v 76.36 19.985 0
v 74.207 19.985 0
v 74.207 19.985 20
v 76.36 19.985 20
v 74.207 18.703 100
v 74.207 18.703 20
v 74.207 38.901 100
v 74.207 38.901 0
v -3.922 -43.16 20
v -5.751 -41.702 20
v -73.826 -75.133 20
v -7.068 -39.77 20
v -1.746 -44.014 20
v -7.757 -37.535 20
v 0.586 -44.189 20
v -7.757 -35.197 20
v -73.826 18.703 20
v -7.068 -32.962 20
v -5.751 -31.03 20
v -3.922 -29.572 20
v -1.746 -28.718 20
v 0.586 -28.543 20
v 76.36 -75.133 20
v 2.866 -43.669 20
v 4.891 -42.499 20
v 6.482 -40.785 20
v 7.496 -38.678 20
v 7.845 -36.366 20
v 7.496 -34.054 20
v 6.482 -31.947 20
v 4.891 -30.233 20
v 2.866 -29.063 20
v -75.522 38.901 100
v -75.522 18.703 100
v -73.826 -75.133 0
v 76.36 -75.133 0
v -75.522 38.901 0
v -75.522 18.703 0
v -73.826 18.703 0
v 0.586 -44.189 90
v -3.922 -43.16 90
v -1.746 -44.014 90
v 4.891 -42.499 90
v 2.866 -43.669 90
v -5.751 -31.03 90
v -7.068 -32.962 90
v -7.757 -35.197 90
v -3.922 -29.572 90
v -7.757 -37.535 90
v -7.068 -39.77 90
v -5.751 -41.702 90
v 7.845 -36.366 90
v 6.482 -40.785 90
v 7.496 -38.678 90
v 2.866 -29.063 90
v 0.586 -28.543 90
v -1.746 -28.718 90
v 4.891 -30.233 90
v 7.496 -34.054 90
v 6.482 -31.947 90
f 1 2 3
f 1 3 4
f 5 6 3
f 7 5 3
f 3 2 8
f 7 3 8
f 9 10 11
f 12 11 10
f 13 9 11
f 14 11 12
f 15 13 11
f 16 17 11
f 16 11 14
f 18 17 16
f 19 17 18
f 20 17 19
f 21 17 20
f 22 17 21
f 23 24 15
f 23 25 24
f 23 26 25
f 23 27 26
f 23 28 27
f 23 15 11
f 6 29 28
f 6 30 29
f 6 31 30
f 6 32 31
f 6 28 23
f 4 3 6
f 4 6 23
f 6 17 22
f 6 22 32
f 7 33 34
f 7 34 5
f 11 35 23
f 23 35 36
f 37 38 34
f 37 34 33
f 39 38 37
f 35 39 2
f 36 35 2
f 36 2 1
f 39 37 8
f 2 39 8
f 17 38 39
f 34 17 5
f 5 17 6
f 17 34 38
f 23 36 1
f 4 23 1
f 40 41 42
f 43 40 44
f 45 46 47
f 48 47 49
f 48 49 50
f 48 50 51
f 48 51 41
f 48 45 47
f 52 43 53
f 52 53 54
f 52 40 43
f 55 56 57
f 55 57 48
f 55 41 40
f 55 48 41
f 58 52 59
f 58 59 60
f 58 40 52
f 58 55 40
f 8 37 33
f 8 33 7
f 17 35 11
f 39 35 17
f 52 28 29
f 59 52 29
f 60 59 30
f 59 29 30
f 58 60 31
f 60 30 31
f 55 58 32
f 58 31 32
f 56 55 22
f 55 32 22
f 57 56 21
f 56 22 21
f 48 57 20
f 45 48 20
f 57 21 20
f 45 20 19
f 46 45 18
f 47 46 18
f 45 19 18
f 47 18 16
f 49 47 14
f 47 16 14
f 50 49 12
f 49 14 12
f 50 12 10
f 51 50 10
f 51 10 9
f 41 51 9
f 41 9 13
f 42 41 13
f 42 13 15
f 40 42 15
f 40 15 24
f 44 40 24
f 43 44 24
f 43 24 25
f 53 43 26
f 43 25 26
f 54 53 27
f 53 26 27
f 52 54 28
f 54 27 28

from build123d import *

# Parameters (mm, degrees)
F0_W     = 150.186099
F0_H     = 95.117865
F1_DEPTH = 20
F2_R     = 7.844958
F3_DEPTH = 70
F4_W     = 149.729192
F4_H     = 20.198451
F5_DEPTH = 100


with BuildPart() as f1:
    # F0 (on Top) → F1 (new body)
    with BuildSketch(Plane.XY):
        with Locations((1.266945, -27.573706)):
            Rectangle(F0_W, F0_H)
    extrude(amount=F1_DEPTH)

    # F2 (on face) → F3 (join)
    with BuildSketch(Plane.XY.offset(20)):
        with Locations((0, -36.366057)):
            Circle(F2_R)
    extrude(amount=F3_DEPTH)

    # F4 (on Top) → F5 (join)
    with BuildSketch(Plane.XY):
        with Locations((-0.657424, 28.801786)):
            Rectangle(F4_W, F4_H)
    extrude(amount=F5_DEPTH)


solid = f1.part
